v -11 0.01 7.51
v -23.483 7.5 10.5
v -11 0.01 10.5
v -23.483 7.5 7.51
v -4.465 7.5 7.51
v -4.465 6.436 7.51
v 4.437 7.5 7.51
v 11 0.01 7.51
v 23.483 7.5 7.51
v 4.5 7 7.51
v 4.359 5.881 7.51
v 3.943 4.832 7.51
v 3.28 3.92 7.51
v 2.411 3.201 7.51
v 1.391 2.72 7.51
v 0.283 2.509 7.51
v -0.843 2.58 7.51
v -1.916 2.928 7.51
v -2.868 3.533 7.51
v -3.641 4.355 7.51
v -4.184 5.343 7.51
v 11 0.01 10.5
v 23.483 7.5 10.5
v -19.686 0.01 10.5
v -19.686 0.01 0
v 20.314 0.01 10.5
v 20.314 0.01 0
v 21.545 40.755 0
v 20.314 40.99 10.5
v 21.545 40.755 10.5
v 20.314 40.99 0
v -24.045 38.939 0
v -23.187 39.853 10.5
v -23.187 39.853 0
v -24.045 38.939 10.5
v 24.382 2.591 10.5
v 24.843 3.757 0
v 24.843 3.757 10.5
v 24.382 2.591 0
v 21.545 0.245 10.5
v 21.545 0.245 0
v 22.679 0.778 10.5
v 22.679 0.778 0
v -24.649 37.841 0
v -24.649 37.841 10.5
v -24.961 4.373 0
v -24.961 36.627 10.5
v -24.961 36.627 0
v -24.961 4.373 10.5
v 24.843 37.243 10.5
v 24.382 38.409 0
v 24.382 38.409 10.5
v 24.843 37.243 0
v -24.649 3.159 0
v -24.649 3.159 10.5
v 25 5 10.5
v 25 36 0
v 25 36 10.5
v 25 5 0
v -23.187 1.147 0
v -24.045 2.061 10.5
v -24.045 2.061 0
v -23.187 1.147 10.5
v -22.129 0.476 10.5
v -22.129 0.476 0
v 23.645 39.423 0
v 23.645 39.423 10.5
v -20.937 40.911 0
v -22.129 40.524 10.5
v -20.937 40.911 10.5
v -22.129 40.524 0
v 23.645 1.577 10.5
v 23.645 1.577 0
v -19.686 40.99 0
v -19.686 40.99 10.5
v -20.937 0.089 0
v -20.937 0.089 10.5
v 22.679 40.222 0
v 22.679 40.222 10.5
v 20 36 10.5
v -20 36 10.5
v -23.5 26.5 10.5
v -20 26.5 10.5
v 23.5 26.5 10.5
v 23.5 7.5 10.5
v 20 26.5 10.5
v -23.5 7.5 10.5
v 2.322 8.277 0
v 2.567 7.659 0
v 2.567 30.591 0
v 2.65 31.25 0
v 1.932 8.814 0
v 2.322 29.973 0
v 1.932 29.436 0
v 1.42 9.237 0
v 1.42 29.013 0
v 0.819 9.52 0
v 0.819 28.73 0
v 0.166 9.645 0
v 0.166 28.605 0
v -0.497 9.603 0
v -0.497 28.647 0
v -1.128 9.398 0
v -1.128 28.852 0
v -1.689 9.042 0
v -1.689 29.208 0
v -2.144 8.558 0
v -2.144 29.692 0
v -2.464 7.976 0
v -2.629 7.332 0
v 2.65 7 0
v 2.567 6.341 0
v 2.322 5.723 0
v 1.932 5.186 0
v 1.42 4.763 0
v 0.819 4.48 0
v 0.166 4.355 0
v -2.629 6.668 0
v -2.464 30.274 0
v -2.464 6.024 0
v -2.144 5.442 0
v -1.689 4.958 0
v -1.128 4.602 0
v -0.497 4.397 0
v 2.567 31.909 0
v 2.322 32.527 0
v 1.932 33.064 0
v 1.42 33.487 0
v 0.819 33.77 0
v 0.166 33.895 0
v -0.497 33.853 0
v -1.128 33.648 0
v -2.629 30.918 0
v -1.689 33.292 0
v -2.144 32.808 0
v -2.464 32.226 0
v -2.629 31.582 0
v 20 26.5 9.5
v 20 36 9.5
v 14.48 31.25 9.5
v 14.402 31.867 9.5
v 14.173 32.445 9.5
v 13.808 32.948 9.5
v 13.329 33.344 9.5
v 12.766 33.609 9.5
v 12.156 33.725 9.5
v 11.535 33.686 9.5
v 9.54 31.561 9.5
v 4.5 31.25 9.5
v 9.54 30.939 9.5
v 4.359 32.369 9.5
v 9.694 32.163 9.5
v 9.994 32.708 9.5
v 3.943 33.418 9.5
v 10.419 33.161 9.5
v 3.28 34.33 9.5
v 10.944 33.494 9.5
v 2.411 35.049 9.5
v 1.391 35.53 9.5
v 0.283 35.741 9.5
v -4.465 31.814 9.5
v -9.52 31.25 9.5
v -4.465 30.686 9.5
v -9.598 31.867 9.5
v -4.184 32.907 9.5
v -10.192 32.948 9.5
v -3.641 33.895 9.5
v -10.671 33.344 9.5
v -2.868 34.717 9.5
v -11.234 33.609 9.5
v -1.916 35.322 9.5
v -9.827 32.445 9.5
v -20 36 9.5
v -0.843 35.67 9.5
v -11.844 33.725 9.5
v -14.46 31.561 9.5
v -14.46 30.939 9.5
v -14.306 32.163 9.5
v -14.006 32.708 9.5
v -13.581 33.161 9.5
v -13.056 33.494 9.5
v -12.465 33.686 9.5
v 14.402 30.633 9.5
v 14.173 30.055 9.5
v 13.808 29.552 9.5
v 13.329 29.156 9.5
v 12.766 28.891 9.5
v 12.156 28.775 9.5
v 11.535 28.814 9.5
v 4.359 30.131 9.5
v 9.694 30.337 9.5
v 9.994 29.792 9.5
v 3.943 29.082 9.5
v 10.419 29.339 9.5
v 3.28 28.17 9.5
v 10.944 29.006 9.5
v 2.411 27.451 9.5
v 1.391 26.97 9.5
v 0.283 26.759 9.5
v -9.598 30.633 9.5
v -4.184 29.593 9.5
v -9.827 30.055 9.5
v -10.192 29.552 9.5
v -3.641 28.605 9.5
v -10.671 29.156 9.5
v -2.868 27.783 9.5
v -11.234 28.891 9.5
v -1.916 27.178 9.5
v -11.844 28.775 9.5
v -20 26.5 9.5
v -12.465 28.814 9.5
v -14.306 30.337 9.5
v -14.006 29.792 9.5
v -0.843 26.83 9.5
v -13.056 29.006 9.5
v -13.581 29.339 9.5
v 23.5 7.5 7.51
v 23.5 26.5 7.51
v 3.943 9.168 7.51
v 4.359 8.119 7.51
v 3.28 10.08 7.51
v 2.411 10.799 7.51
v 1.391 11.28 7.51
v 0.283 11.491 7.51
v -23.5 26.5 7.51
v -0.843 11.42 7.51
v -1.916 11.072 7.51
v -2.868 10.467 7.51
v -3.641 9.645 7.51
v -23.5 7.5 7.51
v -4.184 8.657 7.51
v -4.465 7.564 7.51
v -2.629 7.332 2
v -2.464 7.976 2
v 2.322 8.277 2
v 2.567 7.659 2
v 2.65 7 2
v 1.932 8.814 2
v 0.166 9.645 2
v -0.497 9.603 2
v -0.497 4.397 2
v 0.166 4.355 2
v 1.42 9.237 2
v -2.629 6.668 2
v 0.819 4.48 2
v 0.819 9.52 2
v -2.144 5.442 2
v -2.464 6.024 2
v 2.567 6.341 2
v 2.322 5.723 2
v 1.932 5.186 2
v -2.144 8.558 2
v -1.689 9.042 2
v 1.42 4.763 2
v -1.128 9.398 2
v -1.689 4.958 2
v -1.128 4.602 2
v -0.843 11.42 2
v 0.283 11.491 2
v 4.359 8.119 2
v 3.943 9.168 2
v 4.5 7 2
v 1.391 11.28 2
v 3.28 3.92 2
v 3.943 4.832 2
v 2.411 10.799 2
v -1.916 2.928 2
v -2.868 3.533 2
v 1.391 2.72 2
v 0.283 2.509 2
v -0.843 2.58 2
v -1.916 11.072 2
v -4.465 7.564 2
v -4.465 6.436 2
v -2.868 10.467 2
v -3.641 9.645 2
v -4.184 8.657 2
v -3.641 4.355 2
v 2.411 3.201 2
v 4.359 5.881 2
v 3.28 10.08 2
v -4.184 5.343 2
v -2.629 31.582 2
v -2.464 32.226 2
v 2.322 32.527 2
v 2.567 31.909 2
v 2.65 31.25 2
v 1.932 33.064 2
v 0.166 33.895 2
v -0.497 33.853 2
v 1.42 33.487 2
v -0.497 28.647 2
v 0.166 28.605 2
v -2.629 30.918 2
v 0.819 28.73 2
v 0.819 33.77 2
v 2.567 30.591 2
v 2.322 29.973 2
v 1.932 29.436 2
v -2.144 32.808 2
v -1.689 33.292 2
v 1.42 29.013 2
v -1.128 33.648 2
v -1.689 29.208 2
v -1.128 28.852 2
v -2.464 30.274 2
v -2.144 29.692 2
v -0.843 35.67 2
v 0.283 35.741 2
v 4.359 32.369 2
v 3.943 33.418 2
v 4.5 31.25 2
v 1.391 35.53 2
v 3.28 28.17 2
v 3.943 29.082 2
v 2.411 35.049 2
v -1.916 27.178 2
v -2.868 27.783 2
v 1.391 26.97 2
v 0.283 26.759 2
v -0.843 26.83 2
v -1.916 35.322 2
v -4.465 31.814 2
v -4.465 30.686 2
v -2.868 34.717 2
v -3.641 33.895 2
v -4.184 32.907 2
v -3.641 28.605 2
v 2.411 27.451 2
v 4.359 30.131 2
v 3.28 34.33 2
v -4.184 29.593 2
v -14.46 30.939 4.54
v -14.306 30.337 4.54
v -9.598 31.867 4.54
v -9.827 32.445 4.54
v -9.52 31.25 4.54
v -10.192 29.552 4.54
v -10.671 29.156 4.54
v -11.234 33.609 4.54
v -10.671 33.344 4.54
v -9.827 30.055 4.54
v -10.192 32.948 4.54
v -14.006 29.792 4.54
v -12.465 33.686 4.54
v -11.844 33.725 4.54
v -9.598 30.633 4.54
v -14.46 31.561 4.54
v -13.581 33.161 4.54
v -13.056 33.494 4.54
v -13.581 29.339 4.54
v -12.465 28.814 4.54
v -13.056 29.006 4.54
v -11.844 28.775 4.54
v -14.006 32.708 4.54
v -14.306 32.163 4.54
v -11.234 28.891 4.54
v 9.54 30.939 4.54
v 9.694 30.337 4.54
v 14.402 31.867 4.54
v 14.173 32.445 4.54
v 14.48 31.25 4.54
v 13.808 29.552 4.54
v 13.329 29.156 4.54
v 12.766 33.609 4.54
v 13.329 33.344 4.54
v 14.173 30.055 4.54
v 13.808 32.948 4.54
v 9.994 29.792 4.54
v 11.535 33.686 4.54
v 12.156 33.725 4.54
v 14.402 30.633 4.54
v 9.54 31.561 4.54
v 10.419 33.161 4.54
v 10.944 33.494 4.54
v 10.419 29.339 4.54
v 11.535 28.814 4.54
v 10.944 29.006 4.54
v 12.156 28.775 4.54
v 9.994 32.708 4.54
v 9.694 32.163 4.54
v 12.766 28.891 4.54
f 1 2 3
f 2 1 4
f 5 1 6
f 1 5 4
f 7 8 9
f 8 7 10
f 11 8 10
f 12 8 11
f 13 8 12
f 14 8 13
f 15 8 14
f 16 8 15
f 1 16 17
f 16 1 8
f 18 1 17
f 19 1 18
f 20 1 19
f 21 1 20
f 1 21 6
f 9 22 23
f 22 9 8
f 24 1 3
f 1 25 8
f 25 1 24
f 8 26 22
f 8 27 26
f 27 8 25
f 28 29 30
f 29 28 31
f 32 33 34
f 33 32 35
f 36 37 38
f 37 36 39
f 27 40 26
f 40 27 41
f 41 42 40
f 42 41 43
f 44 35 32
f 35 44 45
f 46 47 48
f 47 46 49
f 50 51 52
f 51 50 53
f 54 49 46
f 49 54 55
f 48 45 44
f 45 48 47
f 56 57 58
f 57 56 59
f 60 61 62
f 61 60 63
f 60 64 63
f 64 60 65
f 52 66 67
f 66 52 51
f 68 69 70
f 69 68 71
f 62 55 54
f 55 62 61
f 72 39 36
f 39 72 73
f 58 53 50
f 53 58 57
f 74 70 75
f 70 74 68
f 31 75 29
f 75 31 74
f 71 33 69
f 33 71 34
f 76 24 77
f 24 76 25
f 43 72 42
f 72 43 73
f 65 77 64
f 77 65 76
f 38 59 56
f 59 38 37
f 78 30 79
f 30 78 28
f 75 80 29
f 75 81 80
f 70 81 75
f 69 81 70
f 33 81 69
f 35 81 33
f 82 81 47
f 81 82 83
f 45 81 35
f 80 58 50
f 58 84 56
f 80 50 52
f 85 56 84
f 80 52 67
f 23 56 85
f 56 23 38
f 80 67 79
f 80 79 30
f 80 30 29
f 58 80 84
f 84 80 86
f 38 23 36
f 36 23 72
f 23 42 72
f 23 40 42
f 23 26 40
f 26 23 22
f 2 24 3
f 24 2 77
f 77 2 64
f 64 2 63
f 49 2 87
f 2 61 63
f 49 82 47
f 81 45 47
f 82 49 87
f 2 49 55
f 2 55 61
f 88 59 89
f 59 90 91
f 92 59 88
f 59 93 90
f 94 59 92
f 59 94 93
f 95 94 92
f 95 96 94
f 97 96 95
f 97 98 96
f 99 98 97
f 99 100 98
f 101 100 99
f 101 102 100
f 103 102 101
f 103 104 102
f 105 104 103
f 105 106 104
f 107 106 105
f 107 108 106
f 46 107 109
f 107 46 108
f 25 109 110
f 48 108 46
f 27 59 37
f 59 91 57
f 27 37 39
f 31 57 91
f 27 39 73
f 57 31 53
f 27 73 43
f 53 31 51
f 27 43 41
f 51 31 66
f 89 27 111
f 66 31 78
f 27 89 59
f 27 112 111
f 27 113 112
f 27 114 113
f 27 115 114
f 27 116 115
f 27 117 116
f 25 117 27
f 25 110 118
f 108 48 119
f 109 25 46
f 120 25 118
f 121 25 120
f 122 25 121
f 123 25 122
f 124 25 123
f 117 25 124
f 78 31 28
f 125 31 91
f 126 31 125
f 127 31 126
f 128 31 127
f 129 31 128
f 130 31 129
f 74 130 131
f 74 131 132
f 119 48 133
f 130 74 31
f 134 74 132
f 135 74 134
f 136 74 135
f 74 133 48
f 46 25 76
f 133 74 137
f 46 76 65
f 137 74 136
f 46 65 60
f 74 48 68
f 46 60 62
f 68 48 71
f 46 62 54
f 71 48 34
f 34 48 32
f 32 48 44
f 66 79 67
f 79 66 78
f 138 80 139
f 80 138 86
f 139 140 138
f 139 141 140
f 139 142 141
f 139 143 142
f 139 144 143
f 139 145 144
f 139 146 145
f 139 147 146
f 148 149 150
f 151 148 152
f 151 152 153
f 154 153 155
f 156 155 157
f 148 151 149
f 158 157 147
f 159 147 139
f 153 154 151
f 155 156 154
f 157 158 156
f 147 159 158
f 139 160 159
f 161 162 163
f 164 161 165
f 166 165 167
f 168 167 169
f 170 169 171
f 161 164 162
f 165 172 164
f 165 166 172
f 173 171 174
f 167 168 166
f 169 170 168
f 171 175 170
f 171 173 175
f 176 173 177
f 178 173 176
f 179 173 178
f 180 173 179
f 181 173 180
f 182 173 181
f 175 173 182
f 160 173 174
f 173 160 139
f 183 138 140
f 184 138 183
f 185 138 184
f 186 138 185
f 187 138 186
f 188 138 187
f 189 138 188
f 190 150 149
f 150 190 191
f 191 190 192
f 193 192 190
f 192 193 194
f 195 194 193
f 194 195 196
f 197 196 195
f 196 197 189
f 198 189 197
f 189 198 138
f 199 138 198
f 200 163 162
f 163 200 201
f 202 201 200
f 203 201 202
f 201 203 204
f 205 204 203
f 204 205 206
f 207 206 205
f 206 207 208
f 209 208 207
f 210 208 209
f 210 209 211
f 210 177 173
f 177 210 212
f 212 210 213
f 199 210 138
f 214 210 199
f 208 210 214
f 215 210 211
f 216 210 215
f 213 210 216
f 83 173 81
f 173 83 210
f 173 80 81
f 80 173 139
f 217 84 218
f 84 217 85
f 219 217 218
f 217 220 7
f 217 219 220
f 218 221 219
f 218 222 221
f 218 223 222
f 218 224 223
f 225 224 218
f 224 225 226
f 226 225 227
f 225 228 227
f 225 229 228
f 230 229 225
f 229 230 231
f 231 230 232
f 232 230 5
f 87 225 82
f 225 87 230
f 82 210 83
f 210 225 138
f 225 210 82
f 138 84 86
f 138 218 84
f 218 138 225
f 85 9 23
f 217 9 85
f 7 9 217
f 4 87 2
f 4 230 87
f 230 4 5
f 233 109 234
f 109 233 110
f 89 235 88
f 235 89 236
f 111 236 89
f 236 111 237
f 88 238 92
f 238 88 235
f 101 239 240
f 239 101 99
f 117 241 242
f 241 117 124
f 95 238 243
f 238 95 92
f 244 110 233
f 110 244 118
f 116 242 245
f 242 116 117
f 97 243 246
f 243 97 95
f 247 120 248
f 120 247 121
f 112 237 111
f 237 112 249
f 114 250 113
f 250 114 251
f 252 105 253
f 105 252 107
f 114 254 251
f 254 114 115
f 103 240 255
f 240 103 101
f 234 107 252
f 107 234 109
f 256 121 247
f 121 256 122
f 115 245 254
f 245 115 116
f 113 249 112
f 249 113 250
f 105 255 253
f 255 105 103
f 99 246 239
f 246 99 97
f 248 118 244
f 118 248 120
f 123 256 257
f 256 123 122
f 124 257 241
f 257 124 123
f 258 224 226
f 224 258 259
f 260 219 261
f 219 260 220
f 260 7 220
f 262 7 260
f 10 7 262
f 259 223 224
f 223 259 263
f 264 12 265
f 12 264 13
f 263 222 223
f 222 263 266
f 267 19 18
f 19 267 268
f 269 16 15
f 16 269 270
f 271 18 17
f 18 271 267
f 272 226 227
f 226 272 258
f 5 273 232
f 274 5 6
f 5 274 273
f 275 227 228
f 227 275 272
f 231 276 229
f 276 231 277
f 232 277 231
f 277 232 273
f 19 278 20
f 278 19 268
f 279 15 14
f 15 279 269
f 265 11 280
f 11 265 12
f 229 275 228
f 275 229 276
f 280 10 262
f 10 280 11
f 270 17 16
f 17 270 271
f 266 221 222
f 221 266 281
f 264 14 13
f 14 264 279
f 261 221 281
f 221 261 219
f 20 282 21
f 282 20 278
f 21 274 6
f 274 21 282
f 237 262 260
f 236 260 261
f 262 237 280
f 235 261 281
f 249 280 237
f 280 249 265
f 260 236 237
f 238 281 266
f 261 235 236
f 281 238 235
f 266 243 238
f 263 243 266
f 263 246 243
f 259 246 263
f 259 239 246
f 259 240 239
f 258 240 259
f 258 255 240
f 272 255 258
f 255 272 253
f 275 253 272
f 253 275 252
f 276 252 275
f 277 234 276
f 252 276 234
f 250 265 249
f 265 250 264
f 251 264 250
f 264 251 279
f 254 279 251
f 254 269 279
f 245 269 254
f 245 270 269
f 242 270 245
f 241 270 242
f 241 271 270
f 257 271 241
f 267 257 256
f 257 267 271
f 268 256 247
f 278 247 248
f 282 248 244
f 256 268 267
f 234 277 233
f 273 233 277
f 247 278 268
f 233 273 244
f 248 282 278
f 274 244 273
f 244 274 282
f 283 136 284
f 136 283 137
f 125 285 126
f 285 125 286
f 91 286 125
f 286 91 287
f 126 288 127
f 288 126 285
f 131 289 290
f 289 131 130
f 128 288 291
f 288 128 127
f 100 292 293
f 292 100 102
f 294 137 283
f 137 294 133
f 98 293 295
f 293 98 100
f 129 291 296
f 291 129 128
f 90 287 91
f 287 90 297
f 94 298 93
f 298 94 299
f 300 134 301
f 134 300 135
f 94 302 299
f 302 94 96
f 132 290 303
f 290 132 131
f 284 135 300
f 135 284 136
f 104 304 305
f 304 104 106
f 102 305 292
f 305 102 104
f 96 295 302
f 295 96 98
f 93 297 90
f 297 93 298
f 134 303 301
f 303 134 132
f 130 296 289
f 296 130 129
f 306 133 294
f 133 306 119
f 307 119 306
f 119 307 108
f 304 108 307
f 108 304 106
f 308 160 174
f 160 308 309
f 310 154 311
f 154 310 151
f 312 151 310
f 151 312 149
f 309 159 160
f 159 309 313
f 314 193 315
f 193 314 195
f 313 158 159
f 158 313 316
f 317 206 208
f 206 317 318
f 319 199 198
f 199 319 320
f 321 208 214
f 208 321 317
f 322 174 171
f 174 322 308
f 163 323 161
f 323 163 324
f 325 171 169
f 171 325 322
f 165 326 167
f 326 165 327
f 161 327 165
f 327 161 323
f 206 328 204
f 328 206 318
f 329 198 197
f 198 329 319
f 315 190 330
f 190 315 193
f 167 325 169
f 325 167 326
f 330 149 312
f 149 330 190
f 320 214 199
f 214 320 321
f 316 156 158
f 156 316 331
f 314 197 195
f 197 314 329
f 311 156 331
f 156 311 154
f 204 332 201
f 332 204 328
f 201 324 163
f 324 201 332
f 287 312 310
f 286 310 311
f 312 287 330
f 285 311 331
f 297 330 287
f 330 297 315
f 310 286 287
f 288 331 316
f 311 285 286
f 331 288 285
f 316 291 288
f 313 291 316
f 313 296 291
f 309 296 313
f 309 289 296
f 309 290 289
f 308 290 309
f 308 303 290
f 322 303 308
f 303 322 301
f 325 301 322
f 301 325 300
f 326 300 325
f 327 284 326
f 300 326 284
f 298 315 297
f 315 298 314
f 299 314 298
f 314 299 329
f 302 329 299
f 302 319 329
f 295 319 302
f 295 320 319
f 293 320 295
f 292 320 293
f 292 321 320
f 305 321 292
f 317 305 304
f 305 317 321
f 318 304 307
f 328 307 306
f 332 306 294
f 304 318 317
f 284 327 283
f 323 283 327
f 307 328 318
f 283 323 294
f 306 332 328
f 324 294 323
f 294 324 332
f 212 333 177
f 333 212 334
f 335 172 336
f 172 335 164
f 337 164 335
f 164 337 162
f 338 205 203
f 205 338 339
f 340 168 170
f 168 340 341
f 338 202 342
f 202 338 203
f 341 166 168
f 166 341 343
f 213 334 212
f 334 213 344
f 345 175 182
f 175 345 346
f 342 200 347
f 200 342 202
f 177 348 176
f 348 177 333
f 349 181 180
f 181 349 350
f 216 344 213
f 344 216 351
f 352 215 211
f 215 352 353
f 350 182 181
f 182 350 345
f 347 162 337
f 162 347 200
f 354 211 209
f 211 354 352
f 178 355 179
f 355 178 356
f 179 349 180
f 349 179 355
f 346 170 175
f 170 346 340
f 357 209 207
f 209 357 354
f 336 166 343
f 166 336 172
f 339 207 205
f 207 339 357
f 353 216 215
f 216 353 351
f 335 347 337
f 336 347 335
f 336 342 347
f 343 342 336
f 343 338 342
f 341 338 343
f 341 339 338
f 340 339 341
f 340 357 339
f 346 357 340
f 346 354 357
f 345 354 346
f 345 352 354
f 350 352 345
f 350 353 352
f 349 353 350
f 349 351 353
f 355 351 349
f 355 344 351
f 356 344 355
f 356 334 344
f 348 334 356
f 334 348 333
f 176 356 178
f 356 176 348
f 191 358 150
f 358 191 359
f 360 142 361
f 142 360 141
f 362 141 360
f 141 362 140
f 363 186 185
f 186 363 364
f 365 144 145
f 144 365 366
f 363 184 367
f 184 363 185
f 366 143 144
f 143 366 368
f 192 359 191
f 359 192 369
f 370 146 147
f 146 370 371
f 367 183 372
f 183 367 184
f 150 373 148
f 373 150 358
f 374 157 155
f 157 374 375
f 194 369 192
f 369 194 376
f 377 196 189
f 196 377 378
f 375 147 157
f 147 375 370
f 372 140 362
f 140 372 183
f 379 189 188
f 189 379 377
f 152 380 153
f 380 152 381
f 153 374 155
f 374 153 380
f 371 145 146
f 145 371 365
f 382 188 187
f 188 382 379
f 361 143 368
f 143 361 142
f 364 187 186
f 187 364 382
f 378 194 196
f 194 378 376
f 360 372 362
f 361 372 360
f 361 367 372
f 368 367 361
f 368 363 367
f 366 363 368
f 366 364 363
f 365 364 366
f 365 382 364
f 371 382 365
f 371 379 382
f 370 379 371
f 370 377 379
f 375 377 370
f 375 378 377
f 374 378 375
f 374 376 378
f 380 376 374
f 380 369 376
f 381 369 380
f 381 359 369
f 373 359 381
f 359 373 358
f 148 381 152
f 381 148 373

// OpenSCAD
// Scraper Magnetic Holder

// Magnet Diameter
magnet_diam = 4.76;

// Magenet Length
magnet_len = 4.76;

holder(magnet_diam, magnet_len);

module holder(magnet_diam, magnet_len)
{
	$fn = 25;
	extra = .2;
	screw_lip = 2;

	// Add 1mm to the bottom, and 1mm slot for razor blade
	height = screw_lip + 7.5 + 1;
	width = 50;
	length = 41;

	handle_depth = 3;
	triange_width = sqrt(2) * 47 / 2;
	screw_shaft_r = (5 + extra + .1) / 2;
	screw_head_r = 9 / 2;
	screw1_y = 7;
	screw2_y = length - 9.75;

	difference()
	{
		// Base block
		translate([-width/2,0,0])
			minkowski() {
				cube([width - 10, length - 10, height - .01]);
				translate([5, 5, 0]) cylinder(r = 5, h = .01);
			}
		// Slot for razor blade
		translate([-20, length-15, height - 1]) cube([40, 10, 1.1]);
		// Slot for handle
		translate([-47/2, length - 19 - 14.5, height-handle_depth+.01]) cube([47, 19, handle_depth]);
		// Angled retainer for handle
		translate([0, length - 33.5 + .01, height - handle_depth/2+.01]) scale([1,.6,1])
			difference()
			{
				rotate([0, 0, 45]) cube([triange_width, triange_width, handle_depth], center=true);
				translate([-width/2,0,-height/2]) cube([width, width, height]);
			}
		//translate([0,0,height - handle_depth/2+.01]) cube([26, 10, handle_depth], center=true);

		// Mounting Screws
		translate([0, screw1_y, -.01]) cylinder(h = 2.1, r = screw_shaft_r);
		translate([0, screw1_y, screw_lip]) cylinder(h = height, r = screw_head_r);

		translate([0, screw2_y, -.01]) cylinder(h = 2.1, r = screw_shaft_r);
		translate([0, screw2_y, screw_lip]) cylinder(h = height, r = screw_head_r);

		// Magnet holes
		translate([-12, screw2_y, height - magnet_len - 1 - extra]) cylinder(h = magnet_len + 1, r = magnet_diam / 2 + extra/2);
		translate([12, screw2_y, height - magnet_len - 1 - extra]) cylinder(h = magnet_len + 1, r = magnet_diam / 2 + extra/2);
	}
}
